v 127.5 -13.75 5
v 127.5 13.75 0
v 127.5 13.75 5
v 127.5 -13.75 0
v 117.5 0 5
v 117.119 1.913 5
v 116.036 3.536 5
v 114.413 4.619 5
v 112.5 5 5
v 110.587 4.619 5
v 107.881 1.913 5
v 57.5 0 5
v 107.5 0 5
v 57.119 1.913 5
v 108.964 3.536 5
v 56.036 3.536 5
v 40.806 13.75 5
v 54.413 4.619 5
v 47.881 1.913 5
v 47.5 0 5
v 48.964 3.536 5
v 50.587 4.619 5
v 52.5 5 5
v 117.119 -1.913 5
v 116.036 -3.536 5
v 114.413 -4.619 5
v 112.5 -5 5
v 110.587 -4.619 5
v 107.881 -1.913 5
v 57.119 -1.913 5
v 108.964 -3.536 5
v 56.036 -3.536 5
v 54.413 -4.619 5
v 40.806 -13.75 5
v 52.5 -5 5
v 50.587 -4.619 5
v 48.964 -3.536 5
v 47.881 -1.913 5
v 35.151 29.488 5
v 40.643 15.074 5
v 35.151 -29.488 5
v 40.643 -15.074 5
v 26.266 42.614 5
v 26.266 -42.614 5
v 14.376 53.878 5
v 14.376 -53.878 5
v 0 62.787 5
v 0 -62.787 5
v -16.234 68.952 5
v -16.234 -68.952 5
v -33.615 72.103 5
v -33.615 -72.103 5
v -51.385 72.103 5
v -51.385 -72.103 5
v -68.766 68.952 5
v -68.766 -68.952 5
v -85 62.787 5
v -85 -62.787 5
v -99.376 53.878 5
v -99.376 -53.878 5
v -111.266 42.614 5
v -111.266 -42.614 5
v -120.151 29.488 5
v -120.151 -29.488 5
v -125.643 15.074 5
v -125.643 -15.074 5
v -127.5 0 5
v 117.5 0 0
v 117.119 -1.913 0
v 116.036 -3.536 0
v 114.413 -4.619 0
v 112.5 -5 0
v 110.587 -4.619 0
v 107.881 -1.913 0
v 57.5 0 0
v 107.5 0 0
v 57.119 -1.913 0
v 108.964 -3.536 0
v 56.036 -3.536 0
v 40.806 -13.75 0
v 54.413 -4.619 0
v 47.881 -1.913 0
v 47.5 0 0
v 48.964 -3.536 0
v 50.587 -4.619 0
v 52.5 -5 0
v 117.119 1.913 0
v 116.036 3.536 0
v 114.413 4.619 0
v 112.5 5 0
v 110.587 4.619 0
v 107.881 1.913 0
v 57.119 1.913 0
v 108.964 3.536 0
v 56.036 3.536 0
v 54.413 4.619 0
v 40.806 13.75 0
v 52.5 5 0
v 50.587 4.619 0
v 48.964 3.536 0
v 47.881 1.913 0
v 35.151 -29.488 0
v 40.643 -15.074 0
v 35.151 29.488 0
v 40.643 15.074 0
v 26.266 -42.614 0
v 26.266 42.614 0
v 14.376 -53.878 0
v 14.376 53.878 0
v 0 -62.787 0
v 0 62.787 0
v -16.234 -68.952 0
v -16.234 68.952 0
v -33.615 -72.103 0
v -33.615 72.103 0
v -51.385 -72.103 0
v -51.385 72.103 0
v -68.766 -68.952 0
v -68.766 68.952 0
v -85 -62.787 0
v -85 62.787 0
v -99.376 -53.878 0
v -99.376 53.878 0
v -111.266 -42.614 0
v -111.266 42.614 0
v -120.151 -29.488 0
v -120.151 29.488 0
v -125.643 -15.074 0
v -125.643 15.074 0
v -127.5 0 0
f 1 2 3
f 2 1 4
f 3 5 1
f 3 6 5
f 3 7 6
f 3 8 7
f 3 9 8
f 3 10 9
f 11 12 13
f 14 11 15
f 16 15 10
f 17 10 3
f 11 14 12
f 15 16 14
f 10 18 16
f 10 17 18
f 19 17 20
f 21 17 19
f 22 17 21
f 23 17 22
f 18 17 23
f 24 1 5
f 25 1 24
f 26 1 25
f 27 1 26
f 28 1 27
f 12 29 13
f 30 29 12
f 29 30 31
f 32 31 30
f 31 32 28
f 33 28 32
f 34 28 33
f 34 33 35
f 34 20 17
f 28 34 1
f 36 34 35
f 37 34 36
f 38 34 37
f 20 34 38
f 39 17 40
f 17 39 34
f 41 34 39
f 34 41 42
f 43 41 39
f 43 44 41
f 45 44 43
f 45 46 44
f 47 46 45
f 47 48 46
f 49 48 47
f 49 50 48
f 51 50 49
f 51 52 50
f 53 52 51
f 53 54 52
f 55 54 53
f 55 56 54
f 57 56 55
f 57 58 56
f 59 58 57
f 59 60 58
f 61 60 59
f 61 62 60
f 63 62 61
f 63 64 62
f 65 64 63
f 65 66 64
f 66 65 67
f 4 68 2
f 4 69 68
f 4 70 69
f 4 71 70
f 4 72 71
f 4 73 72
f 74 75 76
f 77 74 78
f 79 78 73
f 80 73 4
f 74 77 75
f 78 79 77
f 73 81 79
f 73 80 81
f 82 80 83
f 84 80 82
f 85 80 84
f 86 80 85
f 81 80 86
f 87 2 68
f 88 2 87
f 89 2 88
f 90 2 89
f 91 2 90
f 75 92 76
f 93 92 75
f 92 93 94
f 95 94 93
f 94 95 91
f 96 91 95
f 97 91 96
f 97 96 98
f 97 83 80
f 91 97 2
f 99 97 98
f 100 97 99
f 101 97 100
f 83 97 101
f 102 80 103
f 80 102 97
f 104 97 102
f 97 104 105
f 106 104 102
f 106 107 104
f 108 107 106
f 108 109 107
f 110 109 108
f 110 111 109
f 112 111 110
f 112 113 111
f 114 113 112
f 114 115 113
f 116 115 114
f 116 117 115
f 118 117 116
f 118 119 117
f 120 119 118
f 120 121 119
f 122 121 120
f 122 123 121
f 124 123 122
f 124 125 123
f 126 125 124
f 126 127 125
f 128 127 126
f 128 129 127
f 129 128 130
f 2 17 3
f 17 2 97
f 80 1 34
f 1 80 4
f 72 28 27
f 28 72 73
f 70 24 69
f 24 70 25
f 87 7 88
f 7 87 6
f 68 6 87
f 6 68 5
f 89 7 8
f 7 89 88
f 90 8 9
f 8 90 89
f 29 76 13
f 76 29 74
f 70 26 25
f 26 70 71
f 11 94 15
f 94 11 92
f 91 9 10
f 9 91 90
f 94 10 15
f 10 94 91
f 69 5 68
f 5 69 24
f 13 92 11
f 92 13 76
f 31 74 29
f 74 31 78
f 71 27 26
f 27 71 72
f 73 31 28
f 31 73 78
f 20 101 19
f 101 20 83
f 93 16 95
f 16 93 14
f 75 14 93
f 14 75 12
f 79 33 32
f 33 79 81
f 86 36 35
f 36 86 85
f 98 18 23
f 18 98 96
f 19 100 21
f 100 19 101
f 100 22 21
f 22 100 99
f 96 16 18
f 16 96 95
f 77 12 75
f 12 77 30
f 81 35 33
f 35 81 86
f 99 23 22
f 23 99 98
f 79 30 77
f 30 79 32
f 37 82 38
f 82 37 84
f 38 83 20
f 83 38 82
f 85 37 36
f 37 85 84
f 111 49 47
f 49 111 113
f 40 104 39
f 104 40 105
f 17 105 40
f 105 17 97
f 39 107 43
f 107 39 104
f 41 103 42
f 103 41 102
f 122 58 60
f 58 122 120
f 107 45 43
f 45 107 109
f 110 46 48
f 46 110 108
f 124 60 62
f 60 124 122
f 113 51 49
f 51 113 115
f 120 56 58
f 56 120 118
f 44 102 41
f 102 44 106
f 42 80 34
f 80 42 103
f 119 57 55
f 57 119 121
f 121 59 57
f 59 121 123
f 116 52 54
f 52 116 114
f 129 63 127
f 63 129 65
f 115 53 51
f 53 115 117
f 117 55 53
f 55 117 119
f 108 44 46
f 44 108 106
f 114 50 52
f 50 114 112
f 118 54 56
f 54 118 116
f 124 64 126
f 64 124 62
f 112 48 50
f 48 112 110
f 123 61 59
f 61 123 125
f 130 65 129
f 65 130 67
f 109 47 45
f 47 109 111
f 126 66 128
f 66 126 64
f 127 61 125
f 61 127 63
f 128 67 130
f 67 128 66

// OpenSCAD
// file: pins.scad
// Pin Connectors V2
// Tony Buser <tbuser@gmail.com>

//pinhole(h=5);
//pingpeg(10)
//test();
//pintack(h=10);
//pinpeg(h=20);

module test() {
  tolerance = 0.3;
  
  translate([-12, 12, 0]) pinpeg(h=20);
  translate([12, 12, 0]) pintack(h=10);
  
  difference() {
    union() {
      translate([0, -12, 2.5]) cube(size = [59, 20, 5], center = true);
      translate([24, -12, 7.5]) cube(size = [12, 20, 15], center = true);
    }
    translate([-24, -12, 0]) pinhole(h=5, t=tolerance);
    translate([-12, -12, 0]) pinhole(h=5, t=tolerance, tight=false);
    translate([0, -12, 0]) pinhole(h=10, t=tolerance);
    translate([12, -12, 0]) pinhole(h=10, t=tolerance, tight=false);
    translate([24, -12, 15]) rotate([0, 180, 0]) pinhole(h=10, t=tolerance);
  }
}

module pinhole(h=10, r=4, lh=3, lt=1, t=0.3, tight=true) {
  // h = shaft height
  // r = shaft radius
  // lh = lip height
  // lt = lip thickness
  // t = tolerance
  // tight = set to false if you want a joint that spins easily
  
  union() {
    pin_solid(h, r+(t/2), lh, lt);
    cylinder(h=h+0.2, r=r);
    // widen the cylinder slightly
    // cylinder(h=h+0.2, r=r+(t-0.2/2));
    if (tight == false) {
      cylinder(h=h+0.2, r=r+(t/2)+0.25);
    }
    // widen the entrance hole to make insertion easier
    translate([0, 0, -0.1]) cylinder(h=lh/3, r2=r, r1=r+(t/2)+(lt/2));
  }
}

module pin(h=10, r=4, lh=3, lt=1, side=false) {
  // h = shaft height
  // r = shaft radius
  // lh = lip height
  // lt = lip thickness
  // side = set to true if you want it printed horizontally

  if (side) {
    pin_horizontal(h, r, lh, lt);
  } else {
    pin_vertical(h, r, lh, lt);
  }
}

module pintack(h=10, r=4, lh=3, lt=1, bh=3, br=8.75) {
  // bh = base_height
  // br = base_radius
  
  union() {
    cylinder(h=bh, r=br);
    translate([0, 0, bh]) pin(h, r, lh, lt);
  }
}

module pinpeg(h=20, r=4, lh=3, lt=1) {
  union() {
    translate([0, -h/4+0.05, 0]) pin(h/2+0.1, r, lh, lt, side=true);
    translate([0, h/4-0.05, 0]) rotate([0, 0, 180]) pin(h/2+0.1, r, lh, lt, side=true);
  }
}

// just call pin instead, I made this module because it was easier to do the rotation option this way
// since openscad complains of recursion if I did it all in one module
module pin_vertical(h=10, r=4, lh=3, lt=1) {
  // h = shaft height
  // r = shaft radius
  // lh = lip height
  // lt = lip thickness

  difference() {
    pin_solid(h, r, lh, lt);
    
    // center cut
    translate([-r*0.5/2, -(r*2+lt*2)/2, h/4]) cube([r*0.5, r*2+lt*2, h]);
    translate([0, 0, h/4]) cylinder(h=h+lh, r=r/2.5, $fn=20);
    // center curve
    // translate([0, 0, h/4]) rotate([90, 0, 0]) cylinder(h=r*2, r=r*0.5/2, center=true, $fn=20);
  
    // side cuts
    translate([-r*2, -lt-r*1.125, -1]) cube([r*4, lt*2, h+2]);
    translate([-r*2, -lt+r*1.125, -1]) cube([r*4, lt*2, h+2]);
  }
}

// call pin with side=true instead of this
module pin_horizontal(h=10, r=4, lh=3, lt=1) {
  // h = shaft height
  // r = shaft radius
  // lh = lip height
  // lt = lip thickness
  translate([0, h/2, r*1.125-lt]) rotate([90, 0, 0]) pin_vertical(h, r, lh, lt);
}

// this is mainly to make the pinhole module easier
module pin_solid(h=10, r=4, lh=3, lt=1) {
  union() {
    // shaft
    cylinder(h=h-lh, r=r, $fn=30);
    // lip
    // translate([0, 0, h-lh]) cylinder(h=lh*0.25, r1=r, r2=r+(lt/2), $fn=30);
    // translate([0, 0, h-lh+lh*0.25]) cylinder(h=lh*0.25, r2=r, r1=r+(lt/2), $fn=30);
    // translate([0, 0, h-lh+lh*0.50]) cylinder(h=lh*0.50, r1=r, r2=r-(lt/2), $fn=30);

    // translate([0, 0, h-lh]) cylinder(h=lh*0.50, r1=r, r2=r+(lt/2), $fn=30);
    // translate([0, 0, h-lh+lh*0.50]) cylinder(h=lh*0.50, r1=r+(lt/2), r2=r-(lt/3), $fn=30);    

    translate([0, 0, h-lh]) cylinder(h=lh*0.25, r1=r, r2=r+(lt/2), $fn=30);
    translate([0, 0, h-lh+lh*0.25]) cylinder(h=lh*0.25, r=r+(lt/2), $fn=30);    
    translate([0, 0, h-lh+lh*0.50]) cylinder(h=lh*0.50, r1=r+(lt/2), r2=r-(lt/2), $fn=30);    

    // translate([0, 0, h-lh]) cylinder(h=lh, r1=r+(lt/2), r2=1, $fn=30);
    // translate([0, 0, h-lh-lt/2]) cylinder(h=lt/2, r1=r, r2=r+(lt/2), $fn=30);
  }
}
// main file
// Measuring a paddle I like:
// the face is an oval: 150mm, 175mm,  5mm
// the handle overlaps the oval by about 5mm
// handle is a cylinder 9.5cm, 2.75cm, 2cm thick
// s curves meeting the handle shaft.
// x y z

include <pins.scad>;

face_thick = 5.0;
face_wide = 145.0;
face_high = 170.0;
handle_shaft_overlap = 5.0;
handle_shaft_high = 90.0;
handle_shaft_wide = 27.5;
handle_shaft_thick = face_thick;
handle_thick = 20.0;
pin_diameter = 5;

echo("Total paddle height (mm):", total_paddle_height);
total_paddle_height = face_high+handle_shaft_high-handle_shaft_overlap;
total_paddle_x_origin = -((total_paddle_height)/2 - face_high/2);

module handle_shaft() {
	difference() {
		cube([handle_shaft_high,handle_shaft_wide,handle_shaft_thick],true);
		translate([handle_shaft_high/3,0,0])
			cylinder(handle_shaft_thick,pin_diameter,pin_diameter,true);
		translate([-(handle_shaft_high*1/3),0,0])
			cylinder(handle_shaft_thick,pin_diameter,pin_diameter,true);
	}
}

module paddle_oval() {
	scale([(face_high / face_wide), 1, 1]) {
		cylinder(face_thick,face_wide/2,face_wide/2);
	}
}

module paddleface() {
	{
		translate([total_paddle_x_origin, 0, 0]) paddle_oval();
		handle_origin_x = face_high/2 + handle_shaft_high/2 - handle_shaft_overlap;
		translate([handle_origin_x+total_paddle_x_origin, 0, handle_shaft_thick/2]) {
			handle_shaft();
		}
	}
}

module paddlehandle() {
	translate([-total_paddle_x_origin-handle_shaft_overlap,0,handle_shaft_thick/2]) difference () {
		rotate([90,0,90]) {
			difference() {
				difference() {
					difference() {
						scale([1, (handle_thick / handle_shaft_wide), 1]) {
							cylinder(handle_shaft_high,handle_thick/2.0+4,handle_thick/2.0+4);
						}
						translate([0,0,handle_shaft_high/2]) {
							cube([handle_shaft_wide+3,handle_shaft_thick,handle_shaft_high],true);
						}
					}
					translate([0,handle_shaft_thick*2+3,0]) {
						rotate([-20,0,0]) {
							cube([handle_shaft_wide,handle_shaft_thick*3,handle_shaft_high],true);
						}
					}
				}
				translate([0,-handle_shaft_thick,handle_shaft_high/2]) {
					cube([handle_shaft_wide,handle_shaft_thick*3,handle_shaft_high],true);
				}
			}
		}
		translate([-total_paddle_x_origin+(handle_shaft_overlap/2),0,handle_shaft_thick/2]) {
		translate([handle_shaft_high*1/3,0,0])
			pinhole(6,5,3,1,0.3,true);
			
		translate([(-handle_shaft_high*1/3),0,0])
			pinhole(6,5,3,1,0.3,true);
		}
	}

//pinhole(h=10, r=4, lh=2, lt=1, t=0.3, tight=true)

}

//pinhole(10,5);

module pins() {
	pinpeg(handle_shaft_thick+12,pin_diameter);
}

//pins();
//paddlehandle();
paddleface();
